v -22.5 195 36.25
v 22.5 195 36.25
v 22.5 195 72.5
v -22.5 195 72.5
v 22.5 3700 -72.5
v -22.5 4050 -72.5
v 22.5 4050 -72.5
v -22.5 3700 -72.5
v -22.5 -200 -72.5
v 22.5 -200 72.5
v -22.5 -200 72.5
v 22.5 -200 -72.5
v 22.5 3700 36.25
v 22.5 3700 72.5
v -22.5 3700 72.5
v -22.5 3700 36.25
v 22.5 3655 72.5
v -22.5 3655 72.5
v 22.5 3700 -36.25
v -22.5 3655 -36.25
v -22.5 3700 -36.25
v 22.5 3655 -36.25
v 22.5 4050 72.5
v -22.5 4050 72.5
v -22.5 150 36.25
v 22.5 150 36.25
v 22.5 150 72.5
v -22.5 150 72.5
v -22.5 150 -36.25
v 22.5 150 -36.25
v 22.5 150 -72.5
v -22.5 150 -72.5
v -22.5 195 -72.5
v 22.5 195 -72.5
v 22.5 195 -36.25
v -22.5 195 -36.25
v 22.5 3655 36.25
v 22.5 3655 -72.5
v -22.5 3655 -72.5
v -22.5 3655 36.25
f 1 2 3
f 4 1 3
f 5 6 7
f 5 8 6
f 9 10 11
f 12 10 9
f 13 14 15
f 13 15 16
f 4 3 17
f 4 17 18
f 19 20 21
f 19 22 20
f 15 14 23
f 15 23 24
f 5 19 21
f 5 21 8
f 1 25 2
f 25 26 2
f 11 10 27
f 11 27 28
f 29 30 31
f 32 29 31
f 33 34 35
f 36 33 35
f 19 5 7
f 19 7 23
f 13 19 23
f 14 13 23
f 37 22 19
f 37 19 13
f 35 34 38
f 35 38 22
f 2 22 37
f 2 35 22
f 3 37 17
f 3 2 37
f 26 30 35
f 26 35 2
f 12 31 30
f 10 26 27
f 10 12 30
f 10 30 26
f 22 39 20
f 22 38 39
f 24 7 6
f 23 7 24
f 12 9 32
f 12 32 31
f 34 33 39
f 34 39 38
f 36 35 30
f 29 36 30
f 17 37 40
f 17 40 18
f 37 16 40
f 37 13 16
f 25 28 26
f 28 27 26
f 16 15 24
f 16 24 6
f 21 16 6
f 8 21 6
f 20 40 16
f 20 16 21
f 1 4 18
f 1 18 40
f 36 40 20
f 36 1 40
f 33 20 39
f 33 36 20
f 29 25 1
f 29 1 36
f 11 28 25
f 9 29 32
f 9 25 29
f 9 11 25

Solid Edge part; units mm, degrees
sketch "Sketch1" plane through (0, 0, 0) normal (0, -1, 0) x (1, 0, 0)
  line L0 (-22.5, -72.5) -> (22.5, -72.5)
  line L1 (22.5, -72.5) -> (22.5, 72.5)
  line L2 (22.5, 72.5) -> (-22.5, 72.5)
  line L3 (-22.5, 72.5) -> (-22.5, -72.5)
extrude "Protrusion1" add sketch "Sketch1" against normal blind 3850
sketch "Sketch2" plane through (22.5, 1925, 0) normal (1, 0, 0) x (0, 1, 0)
  line L0 (1775, 72.5) -> (1775, 36.25)
  line L1 (1775, 36.25) -> (1730, 36.25)
  line L2 (1730, 36.25) -> (1730, 72.5)
  line L3 (1730, 72.5) -> (1775, 72.5)
  line L4 (-1775, 72.5) -> (-1775, 36.25)
  line L5 (-1775, 36.25) -> (-1730, 36.25)
  line L6 (-1730, 36.25) -> (-1730, 72.5)
  line L7 (-1730, 72.5) -> (-1775, 72.5)
extrude "ExtrudedCutout_1" cut sketch "Sketch2" against normal blind 86.6929
mirror "Mirror1" about plane through (0, 0, 0) normal (0, 0, -1) of "ExtrudedCutout_1"
sketch "Sketch3" plane through (0, 3850, 0) normal (0, 1, 0) x (-1, 0, 0)
  line L0 (-22.5, -72.5) -> (22.5, -72.5)
  line L1 (22.5, -72.5) -> (22.5, 72.5)
  line L2 (22.5, 72.5) -> (-22.5, 72.5)
  line L3 (-22.5, 72.5) -> (-22.5, -72.5)
extrude "ExtrudedProtrusion_2" add sketch "Sketch3" along normal blind 200
sketch "Sketch4" plane through (0, 0, 0) normal (0, -1, 0) x (1, 0, 0)
  line L0 (-22.5, -72.5) -> (22.5, -72.5)
  line L1 (22.5, -72.5) -> (22.5, 72.5)
  line L2 (22.5, 72.5) -> (-22.5, 72.5)
  line L3 (-22.5, 72.5) -> (-22.5, -72.5)
extrude "ExtrudedProtrusion_3" add sketch "Sketch4" along normal blind 200
